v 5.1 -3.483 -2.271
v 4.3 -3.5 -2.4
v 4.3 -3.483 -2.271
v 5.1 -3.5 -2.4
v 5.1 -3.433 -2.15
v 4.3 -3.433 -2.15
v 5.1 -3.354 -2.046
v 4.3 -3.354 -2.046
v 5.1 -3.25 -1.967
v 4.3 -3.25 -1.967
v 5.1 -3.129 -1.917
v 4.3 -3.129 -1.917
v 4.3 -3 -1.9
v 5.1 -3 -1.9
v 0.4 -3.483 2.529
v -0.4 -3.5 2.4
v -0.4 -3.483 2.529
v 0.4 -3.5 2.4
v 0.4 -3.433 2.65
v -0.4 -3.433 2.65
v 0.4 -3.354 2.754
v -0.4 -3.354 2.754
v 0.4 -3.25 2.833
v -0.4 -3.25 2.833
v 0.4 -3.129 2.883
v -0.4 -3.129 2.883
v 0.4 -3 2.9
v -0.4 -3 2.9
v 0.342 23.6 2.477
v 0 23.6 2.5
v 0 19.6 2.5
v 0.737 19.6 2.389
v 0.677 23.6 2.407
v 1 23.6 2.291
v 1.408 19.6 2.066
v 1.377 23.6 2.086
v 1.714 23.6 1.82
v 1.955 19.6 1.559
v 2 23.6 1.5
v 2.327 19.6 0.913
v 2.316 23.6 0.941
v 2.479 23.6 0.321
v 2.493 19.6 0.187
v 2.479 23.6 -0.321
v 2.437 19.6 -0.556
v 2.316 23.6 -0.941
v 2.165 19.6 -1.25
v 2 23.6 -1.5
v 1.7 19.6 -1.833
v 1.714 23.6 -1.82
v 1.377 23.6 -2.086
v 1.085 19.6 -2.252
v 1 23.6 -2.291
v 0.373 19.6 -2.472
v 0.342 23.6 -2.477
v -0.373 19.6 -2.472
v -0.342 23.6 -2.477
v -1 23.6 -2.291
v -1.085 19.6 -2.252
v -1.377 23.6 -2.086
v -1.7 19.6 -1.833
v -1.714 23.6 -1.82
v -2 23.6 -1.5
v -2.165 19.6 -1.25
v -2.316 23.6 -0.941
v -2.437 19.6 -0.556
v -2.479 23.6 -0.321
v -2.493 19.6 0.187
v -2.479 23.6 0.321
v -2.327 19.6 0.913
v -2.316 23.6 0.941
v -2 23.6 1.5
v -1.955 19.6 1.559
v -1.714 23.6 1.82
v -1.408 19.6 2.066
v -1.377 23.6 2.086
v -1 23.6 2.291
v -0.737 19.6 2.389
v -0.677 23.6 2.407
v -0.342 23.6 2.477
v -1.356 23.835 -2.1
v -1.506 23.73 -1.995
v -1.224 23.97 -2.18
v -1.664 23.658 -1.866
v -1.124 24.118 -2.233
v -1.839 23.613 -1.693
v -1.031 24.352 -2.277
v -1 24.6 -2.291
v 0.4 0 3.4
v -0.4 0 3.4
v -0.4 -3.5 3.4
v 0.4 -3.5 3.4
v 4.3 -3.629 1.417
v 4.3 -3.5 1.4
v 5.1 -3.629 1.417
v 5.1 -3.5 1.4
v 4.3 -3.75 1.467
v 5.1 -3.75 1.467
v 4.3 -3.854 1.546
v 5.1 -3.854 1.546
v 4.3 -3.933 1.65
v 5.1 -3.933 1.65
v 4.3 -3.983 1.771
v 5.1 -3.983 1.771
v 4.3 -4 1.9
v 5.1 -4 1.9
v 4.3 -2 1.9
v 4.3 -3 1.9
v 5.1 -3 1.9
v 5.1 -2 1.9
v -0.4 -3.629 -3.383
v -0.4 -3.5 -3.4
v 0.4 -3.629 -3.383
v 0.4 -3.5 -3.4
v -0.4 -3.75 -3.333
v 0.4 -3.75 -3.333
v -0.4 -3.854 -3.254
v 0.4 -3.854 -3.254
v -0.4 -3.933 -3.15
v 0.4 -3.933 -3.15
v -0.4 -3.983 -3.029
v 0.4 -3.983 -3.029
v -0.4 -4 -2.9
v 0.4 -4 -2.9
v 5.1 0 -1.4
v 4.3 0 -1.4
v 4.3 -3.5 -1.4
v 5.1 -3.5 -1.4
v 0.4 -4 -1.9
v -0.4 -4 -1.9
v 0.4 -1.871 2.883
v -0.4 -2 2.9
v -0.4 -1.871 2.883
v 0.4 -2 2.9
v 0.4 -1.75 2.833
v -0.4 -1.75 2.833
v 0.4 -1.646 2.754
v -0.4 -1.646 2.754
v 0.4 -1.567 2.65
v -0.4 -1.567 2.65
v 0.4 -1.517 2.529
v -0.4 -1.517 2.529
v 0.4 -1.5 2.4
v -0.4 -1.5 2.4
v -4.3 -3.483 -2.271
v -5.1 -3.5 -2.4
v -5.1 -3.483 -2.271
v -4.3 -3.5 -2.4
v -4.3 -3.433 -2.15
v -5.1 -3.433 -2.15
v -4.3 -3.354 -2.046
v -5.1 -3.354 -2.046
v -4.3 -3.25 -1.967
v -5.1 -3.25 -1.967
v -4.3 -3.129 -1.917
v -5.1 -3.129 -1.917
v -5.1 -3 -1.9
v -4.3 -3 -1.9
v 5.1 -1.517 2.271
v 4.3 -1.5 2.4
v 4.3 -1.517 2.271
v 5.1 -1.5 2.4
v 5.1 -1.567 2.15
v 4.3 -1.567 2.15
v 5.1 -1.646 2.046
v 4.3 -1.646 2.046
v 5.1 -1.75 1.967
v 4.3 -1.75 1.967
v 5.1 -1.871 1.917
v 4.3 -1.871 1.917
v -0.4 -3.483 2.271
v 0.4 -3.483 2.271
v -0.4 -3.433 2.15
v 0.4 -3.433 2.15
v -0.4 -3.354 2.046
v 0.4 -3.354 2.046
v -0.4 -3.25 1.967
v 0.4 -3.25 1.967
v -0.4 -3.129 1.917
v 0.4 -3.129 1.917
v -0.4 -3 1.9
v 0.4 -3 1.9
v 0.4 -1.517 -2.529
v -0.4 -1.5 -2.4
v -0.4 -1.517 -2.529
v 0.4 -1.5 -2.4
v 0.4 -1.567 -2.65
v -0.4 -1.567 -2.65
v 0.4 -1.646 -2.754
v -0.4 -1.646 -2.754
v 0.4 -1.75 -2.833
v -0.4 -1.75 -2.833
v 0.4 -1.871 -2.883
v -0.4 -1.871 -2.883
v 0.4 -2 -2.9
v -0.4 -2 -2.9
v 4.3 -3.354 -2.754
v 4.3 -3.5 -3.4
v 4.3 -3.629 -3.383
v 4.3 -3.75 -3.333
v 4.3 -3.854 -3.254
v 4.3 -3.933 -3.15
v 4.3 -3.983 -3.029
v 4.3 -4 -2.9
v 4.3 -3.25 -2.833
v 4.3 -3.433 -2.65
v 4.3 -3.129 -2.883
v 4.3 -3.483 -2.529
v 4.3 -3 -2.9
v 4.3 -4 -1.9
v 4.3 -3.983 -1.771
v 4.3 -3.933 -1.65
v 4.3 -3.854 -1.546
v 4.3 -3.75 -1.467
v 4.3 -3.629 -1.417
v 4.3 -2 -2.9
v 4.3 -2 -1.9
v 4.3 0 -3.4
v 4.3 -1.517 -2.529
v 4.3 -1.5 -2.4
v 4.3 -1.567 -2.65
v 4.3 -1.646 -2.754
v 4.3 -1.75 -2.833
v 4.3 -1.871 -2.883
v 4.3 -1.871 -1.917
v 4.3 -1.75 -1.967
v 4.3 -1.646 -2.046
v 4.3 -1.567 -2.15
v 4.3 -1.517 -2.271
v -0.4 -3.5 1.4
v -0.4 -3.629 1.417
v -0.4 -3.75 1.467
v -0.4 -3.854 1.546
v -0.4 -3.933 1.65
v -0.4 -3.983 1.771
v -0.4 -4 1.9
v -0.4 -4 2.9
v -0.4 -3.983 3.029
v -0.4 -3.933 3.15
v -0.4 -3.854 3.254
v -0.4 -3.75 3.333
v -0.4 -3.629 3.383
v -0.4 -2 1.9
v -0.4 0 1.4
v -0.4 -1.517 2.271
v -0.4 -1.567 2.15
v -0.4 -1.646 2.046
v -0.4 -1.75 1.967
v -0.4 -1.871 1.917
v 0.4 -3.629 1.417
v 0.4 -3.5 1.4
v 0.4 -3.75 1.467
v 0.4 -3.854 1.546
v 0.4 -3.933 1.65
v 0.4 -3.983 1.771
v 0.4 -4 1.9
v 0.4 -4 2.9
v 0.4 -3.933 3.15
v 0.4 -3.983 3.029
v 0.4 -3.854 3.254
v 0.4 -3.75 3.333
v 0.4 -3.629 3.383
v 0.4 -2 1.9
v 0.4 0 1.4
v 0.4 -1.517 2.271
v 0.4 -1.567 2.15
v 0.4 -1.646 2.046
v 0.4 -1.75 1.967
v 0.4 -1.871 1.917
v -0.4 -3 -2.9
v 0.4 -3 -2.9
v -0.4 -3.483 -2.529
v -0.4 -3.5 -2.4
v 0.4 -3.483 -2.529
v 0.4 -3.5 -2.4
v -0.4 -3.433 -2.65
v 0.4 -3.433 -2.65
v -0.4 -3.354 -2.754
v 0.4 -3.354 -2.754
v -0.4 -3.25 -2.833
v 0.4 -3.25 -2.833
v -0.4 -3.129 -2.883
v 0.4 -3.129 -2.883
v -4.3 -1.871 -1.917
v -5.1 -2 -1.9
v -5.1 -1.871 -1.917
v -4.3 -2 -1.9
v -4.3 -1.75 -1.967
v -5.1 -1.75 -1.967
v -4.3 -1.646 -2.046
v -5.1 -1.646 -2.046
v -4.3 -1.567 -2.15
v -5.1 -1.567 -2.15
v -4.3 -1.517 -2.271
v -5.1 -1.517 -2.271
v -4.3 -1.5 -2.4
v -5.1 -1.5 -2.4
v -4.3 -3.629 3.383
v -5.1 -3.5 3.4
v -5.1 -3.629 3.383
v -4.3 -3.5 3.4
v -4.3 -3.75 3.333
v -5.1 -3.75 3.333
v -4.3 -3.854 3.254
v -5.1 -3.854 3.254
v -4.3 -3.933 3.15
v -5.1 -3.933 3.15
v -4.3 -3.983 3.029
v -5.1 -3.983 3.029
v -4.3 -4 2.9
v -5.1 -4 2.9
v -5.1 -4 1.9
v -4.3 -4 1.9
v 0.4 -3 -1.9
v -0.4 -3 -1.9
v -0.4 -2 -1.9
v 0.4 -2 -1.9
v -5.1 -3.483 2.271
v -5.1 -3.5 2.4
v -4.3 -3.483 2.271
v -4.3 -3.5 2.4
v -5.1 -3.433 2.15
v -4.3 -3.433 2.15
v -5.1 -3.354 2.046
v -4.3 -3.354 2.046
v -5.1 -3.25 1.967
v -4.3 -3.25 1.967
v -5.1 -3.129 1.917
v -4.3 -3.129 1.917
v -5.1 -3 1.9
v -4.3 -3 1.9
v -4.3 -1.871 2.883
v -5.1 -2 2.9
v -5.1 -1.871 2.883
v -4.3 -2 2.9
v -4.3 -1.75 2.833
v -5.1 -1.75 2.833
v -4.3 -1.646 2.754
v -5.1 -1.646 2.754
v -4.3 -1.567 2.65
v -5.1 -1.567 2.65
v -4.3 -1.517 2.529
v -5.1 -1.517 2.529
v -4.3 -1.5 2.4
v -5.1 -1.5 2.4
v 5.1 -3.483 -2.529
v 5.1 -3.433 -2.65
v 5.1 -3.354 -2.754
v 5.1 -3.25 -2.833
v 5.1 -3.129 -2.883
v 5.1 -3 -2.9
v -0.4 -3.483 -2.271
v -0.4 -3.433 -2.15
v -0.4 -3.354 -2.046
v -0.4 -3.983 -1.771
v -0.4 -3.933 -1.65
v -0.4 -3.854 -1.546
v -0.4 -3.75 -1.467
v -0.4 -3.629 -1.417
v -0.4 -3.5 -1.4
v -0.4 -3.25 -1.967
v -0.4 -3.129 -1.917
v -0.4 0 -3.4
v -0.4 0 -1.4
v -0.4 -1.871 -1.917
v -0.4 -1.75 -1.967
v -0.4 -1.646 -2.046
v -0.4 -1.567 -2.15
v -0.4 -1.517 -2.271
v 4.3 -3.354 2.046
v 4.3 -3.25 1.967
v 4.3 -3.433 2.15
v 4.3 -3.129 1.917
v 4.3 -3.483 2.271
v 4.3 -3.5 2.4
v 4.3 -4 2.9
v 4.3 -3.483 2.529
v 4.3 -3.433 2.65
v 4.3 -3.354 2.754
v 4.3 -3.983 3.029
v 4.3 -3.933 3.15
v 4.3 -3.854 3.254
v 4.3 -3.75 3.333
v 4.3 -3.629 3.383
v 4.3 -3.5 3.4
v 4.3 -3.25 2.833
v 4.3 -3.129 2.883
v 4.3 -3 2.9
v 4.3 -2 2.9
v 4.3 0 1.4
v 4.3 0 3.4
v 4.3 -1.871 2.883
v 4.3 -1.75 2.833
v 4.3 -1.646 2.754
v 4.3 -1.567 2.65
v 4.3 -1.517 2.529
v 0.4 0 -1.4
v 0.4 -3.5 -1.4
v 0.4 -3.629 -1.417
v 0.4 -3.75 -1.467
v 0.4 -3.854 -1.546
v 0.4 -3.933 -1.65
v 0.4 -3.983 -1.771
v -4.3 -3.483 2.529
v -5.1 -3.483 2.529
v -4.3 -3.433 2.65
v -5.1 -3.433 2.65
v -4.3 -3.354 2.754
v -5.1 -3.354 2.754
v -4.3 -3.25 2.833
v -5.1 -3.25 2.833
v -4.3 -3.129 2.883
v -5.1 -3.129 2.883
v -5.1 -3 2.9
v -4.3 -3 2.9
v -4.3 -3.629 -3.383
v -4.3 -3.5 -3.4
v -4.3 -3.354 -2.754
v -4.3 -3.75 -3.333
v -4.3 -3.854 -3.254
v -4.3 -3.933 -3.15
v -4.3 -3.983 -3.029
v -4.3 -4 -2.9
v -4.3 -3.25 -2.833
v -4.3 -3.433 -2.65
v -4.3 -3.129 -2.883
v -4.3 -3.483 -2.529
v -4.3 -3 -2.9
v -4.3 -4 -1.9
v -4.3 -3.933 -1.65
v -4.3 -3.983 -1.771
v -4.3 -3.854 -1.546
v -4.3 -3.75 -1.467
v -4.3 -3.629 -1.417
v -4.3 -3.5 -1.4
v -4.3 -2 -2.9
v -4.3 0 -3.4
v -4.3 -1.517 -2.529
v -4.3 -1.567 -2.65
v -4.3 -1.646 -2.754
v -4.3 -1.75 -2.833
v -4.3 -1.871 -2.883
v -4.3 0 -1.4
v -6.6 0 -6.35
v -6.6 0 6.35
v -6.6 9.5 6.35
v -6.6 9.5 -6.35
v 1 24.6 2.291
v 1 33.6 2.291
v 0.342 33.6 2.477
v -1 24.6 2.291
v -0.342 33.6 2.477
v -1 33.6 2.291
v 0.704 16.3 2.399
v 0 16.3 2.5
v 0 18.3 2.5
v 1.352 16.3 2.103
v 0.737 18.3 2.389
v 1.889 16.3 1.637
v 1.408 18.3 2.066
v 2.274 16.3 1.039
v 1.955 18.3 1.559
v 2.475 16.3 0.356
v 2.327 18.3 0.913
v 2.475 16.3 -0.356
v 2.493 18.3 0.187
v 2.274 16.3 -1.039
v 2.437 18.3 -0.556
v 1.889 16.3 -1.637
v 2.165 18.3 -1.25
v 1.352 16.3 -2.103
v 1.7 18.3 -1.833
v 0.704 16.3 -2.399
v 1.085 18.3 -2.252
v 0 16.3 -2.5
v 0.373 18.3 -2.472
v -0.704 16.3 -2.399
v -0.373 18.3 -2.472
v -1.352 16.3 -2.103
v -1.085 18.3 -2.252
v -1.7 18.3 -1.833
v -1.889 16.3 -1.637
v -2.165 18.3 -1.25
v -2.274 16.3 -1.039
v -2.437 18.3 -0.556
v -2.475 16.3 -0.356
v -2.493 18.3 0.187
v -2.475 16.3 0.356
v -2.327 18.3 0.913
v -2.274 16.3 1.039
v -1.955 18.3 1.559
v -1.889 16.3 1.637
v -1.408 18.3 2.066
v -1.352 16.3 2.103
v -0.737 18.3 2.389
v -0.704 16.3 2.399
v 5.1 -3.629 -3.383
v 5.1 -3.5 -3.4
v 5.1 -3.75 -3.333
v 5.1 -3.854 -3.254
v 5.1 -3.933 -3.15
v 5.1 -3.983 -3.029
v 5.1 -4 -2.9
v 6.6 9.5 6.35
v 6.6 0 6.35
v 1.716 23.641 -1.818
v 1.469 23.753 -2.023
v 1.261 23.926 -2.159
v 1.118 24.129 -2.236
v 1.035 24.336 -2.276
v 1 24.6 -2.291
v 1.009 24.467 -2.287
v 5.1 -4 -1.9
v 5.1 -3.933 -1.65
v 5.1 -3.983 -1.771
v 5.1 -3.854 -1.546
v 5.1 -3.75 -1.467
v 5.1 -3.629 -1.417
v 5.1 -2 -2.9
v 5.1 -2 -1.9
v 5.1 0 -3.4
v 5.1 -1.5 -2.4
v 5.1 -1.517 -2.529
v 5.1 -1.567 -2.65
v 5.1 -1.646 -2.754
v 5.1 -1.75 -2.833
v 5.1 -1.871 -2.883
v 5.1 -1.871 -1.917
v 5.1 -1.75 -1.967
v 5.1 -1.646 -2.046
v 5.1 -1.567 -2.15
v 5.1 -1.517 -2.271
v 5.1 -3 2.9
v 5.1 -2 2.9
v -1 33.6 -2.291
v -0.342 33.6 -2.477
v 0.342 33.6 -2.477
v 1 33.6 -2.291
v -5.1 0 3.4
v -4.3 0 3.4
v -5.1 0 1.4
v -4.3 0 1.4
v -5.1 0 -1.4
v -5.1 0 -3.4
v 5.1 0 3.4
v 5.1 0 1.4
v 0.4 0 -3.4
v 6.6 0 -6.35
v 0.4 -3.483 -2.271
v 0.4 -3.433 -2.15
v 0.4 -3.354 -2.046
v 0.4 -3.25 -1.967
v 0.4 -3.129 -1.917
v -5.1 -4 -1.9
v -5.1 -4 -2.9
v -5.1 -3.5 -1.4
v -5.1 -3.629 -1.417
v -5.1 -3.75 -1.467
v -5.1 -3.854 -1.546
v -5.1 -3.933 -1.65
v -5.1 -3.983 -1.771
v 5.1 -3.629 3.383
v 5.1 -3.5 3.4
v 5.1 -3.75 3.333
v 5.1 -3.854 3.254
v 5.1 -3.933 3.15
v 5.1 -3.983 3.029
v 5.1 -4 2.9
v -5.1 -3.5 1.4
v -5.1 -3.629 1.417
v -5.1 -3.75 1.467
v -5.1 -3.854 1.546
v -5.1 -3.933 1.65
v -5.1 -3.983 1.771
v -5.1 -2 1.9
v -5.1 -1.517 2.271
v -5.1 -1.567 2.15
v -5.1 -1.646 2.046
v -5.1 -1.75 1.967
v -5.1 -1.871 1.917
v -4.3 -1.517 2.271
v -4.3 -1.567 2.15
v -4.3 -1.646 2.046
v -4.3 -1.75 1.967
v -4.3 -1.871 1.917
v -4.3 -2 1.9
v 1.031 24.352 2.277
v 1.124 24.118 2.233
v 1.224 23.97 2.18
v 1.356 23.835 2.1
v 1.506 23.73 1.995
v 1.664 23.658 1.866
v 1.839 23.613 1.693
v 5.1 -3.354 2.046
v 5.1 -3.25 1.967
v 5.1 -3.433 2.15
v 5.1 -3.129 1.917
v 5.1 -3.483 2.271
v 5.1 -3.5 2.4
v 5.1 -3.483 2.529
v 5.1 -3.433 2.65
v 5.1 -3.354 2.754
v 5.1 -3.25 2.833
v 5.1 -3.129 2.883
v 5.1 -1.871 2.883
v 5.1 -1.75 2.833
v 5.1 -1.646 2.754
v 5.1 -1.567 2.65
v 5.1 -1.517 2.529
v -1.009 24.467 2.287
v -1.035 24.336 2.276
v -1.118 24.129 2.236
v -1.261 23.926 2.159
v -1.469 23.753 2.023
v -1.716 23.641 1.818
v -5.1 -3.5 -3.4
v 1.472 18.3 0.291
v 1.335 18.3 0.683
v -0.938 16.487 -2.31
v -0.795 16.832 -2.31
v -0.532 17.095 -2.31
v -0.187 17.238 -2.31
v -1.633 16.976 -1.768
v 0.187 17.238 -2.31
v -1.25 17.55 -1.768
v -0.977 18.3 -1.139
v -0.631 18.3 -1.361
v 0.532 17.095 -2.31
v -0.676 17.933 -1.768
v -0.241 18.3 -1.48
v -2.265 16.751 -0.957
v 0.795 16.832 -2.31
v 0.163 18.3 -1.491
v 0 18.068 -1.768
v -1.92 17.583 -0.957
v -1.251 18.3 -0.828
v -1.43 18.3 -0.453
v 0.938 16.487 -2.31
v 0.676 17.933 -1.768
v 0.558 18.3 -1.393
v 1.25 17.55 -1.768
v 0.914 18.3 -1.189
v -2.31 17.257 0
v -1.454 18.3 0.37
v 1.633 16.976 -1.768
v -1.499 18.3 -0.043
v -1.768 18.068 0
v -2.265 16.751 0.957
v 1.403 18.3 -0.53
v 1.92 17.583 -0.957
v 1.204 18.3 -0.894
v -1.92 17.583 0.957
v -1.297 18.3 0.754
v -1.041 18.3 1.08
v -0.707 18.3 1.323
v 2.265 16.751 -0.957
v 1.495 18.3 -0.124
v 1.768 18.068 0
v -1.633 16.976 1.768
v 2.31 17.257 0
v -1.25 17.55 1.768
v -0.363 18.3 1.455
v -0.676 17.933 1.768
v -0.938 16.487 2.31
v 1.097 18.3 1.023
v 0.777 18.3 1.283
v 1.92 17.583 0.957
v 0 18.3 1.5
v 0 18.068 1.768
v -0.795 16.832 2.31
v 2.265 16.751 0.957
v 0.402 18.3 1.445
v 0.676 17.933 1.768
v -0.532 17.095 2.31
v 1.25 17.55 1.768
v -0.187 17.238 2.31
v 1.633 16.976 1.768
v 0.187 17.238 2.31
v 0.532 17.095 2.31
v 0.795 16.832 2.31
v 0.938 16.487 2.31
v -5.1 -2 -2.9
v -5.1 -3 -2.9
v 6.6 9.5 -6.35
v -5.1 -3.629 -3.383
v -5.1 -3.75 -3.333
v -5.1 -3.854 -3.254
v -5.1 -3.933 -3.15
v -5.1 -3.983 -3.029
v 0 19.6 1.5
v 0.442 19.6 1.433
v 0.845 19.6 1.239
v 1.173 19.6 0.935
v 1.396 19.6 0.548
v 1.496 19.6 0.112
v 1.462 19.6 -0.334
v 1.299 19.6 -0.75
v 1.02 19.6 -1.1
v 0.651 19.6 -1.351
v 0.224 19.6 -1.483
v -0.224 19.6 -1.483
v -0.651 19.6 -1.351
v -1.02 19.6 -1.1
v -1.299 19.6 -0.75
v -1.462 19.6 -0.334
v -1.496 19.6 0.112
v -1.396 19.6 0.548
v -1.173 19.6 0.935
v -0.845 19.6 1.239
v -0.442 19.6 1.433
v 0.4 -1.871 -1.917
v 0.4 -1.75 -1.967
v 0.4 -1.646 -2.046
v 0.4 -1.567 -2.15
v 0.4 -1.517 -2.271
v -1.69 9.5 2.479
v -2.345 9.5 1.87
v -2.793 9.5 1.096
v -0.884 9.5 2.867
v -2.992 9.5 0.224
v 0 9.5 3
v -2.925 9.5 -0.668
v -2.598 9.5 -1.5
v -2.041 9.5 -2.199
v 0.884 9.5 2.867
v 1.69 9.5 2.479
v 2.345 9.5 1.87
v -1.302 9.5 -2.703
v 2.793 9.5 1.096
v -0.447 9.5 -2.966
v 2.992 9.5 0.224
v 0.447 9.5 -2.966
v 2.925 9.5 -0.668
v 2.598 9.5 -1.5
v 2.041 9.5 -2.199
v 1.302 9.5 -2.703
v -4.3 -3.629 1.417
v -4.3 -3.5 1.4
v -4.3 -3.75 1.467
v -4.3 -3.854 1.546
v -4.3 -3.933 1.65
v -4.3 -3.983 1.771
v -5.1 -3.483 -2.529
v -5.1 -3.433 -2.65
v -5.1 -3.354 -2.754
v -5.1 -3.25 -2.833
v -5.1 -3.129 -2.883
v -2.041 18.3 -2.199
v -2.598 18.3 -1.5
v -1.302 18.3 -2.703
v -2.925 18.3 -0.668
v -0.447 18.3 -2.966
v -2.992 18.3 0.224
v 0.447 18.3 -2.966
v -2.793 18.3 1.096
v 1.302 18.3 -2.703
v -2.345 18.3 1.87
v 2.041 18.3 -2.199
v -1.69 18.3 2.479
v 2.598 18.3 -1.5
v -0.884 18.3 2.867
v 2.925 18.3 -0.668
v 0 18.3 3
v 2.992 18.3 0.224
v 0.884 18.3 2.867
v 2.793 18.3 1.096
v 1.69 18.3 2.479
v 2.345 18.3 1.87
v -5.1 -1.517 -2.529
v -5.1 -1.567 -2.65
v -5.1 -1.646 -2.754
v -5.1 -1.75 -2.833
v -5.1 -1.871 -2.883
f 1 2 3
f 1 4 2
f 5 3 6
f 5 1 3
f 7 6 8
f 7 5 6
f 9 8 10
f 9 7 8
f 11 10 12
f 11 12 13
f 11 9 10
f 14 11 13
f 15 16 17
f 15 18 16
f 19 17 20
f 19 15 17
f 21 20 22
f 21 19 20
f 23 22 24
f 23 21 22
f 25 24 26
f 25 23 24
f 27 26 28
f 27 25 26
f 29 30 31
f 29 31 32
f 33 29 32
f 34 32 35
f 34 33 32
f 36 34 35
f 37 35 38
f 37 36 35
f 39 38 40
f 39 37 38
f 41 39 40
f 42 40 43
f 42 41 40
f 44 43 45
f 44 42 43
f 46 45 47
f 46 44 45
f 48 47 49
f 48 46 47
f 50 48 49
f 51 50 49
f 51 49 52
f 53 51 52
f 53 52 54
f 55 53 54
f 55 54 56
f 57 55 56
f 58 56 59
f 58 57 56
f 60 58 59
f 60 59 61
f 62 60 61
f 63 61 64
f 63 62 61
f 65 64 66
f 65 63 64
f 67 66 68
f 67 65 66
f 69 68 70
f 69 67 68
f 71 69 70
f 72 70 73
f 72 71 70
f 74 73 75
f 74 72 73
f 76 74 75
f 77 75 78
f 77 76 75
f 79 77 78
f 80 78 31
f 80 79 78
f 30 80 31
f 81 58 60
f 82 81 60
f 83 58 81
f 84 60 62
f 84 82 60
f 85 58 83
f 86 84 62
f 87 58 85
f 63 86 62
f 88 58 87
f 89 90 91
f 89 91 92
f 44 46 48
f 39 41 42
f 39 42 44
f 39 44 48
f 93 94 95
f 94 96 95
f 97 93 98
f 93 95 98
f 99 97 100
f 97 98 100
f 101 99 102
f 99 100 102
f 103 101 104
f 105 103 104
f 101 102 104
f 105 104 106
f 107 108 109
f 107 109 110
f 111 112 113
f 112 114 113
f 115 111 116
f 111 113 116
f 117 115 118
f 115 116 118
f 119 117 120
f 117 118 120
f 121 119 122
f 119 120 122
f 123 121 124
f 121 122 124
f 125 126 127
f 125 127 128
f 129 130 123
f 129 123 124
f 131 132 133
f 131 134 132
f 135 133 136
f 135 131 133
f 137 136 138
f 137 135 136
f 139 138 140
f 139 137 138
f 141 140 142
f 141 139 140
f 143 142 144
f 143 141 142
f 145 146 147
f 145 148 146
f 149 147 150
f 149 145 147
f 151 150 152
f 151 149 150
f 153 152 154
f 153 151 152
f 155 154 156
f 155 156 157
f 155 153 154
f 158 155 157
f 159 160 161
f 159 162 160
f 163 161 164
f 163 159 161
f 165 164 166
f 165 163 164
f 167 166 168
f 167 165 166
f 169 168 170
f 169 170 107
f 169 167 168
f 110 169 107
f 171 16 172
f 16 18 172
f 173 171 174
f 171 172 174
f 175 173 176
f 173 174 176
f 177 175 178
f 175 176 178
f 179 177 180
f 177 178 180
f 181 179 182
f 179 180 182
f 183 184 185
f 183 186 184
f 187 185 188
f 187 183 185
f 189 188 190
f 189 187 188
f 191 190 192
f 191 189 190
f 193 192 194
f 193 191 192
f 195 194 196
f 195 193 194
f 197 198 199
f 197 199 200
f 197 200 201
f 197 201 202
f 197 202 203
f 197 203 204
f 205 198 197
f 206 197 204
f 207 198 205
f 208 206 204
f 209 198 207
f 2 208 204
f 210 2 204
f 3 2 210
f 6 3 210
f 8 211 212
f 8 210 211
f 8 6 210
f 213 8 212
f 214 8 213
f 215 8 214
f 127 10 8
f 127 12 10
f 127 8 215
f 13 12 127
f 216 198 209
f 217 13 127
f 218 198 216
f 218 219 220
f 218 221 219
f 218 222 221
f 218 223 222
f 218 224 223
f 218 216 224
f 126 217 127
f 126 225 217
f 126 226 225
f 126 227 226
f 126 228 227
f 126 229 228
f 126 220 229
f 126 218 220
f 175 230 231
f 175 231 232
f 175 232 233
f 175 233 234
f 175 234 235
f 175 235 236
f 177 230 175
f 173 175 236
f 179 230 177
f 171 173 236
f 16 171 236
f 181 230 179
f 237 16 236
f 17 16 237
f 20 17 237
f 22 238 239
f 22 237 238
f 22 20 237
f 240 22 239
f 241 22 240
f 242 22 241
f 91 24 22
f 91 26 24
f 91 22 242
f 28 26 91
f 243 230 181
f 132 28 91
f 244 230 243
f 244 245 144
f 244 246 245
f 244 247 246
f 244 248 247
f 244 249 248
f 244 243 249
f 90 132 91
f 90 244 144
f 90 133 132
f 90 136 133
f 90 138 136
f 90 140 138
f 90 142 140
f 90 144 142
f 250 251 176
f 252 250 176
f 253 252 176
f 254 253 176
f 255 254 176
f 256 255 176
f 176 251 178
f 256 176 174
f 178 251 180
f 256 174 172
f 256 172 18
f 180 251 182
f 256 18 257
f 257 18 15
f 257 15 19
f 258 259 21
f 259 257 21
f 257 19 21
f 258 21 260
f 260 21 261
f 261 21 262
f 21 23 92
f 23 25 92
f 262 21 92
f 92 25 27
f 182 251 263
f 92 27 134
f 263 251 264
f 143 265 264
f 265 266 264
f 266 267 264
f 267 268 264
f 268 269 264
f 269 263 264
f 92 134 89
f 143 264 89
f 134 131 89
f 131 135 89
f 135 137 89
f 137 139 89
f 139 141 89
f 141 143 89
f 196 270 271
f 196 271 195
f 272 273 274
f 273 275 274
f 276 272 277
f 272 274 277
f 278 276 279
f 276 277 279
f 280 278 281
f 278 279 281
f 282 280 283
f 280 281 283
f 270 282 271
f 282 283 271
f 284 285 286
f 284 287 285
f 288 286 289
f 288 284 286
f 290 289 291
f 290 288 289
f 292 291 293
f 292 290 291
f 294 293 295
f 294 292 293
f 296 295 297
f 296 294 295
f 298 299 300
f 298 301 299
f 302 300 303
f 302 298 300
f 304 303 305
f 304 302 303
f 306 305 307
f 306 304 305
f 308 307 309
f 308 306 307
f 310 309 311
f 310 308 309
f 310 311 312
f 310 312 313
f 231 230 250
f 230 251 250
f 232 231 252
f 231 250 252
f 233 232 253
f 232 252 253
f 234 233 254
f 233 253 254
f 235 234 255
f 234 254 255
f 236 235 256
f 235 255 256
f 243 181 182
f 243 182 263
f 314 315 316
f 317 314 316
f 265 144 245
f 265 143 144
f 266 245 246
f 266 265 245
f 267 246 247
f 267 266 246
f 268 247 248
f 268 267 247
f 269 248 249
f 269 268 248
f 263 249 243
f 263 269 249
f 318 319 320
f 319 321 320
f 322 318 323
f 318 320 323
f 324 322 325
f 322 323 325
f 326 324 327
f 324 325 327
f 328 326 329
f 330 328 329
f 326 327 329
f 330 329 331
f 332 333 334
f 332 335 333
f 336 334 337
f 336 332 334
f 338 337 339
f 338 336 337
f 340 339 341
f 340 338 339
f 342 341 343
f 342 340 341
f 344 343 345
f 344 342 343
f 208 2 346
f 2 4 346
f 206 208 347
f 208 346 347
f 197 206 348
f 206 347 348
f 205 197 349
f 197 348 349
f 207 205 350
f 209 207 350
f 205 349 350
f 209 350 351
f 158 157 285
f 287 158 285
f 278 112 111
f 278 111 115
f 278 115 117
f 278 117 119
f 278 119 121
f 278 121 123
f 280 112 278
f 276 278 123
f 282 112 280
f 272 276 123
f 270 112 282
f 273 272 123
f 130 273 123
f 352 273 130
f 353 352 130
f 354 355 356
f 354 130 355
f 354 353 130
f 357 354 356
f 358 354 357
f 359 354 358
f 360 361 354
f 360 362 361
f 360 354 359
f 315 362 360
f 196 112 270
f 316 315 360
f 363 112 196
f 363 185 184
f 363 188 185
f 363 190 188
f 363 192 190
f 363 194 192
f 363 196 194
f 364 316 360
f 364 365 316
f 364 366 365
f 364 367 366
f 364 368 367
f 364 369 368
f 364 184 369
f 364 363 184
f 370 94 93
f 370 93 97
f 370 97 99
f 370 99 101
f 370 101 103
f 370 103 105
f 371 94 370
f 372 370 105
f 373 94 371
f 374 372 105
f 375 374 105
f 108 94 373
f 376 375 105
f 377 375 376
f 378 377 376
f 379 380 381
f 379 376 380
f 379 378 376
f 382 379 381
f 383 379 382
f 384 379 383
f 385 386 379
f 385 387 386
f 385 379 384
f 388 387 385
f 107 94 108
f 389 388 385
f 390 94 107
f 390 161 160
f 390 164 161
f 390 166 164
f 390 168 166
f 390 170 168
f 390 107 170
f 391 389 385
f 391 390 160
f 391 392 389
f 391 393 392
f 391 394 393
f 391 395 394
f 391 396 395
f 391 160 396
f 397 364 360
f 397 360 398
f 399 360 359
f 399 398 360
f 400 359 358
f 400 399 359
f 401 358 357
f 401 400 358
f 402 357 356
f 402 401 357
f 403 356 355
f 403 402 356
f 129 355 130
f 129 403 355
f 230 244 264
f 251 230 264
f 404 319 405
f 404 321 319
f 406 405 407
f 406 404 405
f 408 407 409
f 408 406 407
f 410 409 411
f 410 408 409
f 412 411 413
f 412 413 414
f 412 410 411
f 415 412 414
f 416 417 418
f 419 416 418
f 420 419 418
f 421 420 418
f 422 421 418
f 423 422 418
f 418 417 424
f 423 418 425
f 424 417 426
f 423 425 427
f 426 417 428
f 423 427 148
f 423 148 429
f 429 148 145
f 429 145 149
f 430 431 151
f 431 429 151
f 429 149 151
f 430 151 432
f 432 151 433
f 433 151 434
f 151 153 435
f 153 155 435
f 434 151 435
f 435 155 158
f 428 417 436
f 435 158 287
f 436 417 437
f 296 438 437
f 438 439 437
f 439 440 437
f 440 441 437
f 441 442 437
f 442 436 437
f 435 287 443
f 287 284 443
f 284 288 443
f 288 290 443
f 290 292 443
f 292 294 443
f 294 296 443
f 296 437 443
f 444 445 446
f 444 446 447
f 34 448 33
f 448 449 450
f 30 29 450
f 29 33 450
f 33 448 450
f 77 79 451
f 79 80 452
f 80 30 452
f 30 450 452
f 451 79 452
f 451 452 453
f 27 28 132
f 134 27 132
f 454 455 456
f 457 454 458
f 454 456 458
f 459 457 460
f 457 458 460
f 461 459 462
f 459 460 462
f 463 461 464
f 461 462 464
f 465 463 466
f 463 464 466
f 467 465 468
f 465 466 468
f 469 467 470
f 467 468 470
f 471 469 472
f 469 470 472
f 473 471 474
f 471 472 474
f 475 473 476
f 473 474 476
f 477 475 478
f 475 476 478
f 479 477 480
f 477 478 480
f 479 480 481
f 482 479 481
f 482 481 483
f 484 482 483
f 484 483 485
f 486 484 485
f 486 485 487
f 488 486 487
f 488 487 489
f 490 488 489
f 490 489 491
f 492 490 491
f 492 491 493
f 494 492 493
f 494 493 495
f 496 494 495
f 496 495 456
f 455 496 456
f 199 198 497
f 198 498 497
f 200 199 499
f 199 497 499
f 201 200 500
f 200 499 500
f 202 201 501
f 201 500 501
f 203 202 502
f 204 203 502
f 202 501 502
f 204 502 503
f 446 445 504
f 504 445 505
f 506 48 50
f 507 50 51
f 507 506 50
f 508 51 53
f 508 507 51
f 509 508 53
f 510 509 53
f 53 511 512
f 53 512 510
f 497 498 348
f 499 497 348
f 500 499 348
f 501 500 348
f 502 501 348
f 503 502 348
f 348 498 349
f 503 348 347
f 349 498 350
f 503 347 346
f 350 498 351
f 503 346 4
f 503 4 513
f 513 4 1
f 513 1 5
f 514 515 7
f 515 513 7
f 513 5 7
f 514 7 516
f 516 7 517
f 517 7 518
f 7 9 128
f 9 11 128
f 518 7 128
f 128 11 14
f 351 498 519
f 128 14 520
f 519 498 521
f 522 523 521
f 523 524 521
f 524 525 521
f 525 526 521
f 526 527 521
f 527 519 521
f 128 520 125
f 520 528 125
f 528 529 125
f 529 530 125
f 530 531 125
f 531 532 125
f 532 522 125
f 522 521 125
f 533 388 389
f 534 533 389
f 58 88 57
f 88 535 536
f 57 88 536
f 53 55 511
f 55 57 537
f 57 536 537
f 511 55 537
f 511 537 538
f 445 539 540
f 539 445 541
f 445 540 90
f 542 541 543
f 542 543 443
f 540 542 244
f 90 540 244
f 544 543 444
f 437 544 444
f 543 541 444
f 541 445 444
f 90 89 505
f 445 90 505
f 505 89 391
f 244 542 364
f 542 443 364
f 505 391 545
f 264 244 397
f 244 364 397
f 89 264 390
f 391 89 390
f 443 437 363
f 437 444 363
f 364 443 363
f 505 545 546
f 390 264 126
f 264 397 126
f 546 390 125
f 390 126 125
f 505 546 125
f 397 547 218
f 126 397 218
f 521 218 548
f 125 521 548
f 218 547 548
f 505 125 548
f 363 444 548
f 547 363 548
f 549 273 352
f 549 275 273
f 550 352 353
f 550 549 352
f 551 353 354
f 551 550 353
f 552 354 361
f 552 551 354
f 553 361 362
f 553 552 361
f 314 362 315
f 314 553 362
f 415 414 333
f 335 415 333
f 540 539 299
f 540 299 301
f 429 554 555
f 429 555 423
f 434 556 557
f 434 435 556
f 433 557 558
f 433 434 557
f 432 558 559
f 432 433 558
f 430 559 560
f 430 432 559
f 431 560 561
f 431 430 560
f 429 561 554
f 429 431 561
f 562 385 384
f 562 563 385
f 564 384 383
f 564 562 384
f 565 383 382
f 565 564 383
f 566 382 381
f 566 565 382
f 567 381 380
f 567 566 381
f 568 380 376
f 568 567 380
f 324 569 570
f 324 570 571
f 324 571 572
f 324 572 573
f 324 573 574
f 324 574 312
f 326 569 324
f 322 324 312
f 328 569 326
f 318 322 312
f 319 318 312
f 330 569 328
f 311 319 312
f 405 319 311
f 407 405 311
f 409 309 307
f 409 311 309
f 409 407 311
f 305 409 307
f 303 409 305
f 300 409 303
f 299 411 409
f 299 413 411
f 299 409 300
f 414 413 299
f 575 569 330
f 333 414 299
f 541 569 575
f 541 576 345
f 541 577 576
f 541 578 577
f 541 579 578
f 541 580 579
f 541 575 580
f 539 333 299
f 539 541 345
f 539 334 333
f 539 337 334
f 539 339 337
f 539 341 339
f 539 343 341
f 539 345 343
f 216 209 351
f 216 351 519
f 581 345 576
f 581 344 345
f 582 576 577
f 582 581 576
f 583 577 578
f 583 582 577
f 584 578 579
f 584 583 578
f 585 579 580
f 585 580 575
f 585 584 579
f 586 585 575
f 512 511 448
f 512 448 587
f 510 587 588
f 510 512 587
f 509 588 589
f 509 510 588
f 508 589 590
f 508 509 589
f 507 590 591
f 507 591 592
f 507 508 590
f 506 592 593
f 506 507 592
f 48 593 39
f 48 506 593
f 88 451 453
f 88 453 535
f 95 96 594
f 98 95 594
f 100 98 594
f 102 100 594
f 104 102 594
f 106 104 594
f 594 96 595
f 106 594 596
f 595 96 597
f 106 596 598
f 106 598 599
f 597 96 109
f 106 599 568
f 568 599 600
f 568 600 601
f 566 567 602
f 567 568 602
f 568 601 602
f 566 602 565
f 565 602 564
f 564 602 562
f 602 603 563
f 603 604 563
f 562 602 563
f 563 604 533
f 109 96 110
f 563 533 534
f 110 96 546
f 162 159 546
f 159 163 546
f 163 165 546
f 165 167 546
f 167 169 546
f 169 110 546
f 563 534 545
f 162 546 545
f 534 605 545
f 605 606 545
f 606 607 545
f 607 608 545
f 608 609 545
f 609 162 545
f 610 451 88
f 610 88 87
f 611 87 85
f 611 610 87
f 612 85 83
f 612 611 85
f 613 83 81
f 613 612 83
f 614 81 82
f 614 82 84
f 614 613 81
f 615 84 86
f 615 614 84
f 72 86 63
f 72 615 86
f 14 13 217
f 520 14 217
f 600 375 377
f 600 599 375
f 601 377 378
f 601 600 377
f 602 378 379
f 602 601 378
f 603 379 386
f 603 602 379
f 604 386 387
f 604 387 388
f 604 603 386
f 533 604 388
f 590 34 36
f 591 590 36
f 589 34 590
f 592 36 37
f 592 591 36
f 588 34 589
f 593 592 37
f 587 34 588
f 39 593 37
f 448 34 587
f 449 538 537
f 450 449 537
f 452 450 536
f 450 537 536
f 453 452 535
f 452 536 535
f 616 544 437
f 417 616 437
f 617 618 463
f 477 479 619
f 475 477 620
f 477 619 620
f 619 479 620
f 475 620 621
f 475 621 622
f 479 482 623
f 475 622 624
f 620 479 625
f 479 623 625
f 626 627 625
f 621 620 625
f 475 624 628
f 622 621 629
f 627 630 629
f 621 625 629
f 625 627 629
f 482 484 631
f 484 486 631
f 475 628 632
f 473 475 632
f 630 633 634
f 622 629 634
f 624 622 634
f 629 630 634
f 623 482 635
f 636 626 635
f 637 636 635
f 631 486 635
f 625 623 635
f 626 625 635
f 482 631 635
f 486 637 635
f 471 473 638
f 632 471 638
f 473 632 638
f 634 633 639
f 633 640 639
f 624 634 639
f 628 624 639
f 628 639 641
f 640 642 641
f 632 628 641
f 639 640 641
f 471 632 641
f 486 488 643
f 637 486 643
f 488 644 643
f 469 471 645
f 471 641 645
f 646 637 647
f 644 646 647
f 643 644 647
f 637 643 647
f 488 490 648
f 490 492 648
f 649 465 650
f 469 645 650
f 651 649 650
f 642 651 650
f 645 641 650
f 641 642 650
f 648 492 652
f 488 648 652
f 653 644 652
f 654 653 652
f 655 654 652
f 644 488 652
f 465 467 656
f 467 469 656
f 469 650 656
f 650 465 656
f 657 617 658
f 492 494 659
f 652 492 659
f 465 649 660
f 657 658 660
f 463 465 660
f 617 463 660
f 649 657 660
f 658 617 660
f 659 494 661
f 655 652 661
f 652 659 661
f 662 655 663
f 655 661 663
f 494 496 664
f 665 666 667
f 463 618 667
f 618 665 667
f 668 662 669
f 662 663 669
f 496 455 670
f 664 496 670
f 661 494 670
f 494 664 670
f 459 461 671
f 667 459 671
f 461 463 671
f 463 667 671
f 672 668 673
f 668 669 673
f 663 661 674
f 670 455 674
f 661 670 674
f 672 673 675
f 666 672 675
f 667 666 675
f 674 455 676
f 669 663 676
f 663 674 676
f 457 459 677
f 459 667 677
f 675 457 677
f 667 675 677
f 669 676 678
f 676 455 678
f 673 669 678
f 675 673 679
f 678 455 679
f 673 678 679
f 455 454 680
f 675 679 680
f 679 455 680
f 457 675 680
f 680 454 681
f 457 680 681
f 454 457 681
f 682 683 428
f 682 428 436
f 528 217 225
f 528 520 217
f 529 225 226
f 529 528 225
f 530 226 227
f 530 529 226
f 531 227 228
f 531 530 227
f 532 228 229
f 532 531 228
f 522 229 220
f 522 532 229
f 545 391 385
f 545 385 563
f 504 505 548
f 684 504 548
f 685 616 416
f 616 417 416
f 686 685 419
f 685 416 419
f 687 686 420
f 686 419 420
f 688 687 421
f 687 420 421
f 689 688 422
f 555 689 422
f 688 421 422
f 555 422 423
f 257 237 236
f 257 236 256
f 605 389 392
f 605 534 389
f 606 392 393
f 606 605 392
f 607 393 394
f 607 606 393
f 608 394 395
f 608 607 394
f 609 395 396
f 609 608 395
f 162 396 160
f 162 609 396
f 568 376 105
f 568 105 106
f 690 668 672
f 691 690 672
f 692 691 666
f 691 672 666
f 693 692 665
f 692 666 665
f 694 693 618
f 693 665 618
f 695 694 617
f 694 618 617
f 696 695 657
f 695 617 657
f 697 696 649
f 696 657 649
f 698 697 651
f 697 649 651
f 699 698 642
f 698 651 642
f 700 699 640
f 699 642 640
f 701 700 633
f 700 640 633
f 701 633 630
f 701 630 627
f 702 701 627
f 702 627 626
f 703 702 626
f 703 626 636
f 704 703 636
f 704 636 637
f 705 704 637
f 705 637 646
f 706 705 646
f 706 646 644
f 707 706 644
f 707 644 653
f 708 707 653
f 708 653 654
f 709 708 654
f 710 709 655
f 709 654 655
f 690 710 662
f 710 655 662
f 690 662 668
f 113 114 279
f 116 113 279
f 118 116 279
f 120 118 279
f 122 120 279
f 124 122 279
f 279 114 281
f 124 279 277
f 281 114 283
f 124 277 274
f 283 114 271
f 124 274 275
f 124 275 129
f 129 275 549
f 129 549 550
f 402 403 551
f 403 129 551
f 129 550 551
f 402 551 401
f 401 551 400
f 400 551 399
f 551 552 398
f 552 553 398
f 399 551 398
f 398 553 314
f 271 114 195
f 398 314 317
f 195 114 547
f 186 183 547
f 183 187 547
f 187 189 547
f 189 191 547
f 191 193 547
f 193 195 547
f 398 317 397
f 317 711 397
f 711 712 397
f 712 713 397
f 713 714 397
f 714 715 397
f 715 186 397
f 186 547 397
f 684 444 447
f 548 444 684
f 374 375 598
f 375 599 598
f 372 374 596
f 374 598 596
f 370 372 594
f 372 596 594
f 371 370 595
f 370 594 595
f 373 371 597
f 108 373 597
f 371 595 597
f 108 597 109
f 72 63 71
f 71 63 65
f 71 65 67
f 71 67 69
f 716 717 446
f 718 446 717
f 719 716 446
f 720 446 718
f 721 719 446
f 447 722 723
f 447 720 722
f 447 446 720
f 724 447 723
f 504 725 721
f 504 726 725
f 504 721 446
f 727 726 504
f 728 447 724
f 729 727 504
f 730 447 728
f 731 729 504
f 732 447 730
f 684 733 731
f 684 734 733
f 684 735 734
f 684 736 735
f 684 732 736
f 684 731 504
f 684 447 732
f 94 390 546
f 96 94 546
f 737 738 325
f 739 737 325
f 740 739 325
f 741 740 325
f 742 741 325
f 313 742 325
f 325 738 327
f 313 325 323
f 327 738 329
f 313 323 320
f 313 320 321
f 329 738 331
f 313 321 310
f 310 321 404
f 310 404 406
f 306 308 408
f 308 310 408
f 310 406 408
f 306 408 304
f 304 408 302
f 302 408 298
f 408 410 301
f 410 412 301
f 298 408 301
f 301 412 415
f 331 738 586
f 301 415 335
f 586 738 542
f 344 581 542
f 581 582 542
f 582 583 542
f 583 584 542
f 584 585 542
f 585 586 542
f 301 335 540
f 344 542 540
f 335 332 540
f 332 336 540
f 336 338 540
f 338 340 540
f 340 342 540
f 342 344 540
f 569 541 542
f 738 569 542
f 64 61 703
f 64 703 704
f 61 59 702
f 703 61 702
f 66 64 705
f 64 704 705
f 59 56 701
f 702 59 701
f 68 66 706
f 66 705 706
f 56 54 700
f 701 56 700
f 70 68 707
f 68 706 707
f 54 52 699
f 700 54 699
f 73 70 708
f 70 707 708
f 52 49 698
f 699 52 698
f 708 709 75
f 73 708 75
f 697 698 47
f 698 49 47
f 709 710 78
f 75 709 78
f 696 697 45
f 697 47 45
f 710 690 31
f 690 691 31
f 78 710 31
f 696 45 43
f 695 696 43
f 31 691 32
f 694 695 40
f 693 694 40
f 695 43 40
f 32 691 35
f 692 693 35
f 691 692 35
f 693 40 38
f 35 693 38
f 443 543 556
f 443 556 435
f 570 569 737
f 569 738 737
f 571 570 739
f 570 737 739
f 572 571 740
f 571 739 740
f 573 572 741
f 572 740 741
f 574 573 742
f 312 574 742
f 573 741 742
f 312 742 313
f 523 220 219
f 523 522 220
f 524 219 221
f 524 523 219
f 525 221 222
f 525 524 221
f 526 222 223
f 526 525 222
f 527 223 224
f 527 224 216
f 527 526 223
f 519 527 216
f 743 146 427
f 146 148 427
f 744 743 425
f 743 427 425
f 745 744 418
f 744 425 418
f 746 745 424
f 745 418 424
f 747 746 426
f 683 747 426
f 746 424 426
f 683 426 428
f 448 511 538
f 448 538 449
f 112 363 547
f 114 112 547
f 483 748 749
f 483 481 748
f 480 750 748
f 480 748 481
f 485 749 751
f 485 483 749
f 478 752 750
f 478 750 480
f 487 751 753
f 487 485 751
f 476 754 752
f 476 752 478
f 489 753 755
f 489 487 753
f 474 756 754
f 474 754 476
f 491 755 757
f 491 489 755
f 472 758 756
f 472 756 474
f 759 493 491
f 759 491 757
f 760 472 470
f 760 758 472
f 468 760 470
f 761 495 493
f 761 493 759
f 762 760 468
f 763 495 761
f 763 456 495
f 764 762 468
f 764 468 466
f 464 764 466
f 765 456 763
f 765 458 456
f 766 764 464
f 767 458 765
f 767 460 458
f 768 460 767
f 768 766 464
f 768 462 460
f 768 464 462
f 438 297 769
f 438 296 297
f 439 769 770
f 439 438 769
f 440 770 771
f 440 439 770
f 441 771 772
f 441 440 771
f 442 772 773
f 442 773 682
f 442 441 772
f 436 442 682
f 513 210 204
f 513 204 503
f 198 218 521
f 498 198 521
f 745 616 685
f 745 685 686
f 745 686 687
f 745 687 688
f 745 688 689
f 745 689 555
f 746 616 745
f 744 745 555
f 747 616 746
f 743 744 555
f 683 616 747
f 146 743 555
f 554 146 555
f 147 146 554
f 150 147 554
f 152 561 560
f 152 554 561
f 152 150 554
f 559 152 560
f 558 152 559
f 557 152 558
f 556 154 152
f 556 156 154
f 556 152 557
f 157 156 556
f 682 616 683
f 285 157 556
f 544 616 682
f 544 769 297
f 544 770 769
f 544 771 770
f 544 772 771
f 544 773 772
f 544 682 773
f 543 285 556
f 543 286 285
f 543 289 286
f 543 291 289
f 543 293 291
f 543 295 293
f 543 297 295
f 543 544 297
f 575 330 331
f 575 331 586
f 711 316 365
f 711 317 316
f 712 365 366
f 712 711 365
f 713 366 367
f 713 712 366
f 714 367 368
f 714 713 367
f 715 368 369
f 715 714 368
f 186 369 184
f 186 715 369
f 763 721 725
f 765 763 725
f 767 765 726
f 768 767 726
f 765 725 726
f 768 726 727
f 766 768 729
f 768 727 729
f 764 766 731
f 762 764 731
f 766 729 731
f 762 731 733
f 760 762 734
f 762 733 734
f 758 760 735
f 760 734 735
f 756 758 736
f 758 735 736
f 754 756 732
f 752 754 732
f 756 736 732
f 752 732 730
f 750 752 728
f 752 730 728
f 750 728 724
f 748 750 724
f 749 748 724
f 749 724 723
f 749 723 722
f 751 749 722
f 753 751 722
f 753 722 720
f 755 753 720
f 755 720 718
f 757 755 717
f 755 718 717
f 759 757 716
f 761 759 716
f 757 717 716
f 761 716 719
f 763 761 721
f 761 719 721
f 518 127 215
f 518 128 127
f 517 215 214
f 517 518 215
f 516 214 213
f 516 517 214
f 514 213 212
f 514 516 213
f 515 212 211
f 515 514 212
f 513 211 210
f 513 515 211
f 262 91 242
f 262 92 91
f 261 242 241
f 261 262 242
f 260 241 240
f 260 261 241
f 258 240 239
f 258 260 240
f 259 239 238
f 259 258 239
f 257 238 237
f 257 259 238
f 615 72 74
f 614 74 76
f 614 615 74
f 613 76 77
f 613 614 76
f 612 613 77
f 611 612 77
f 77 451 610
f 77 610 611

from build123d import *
from build123d.topology import SkipClean

# Parameters (mm, degrees)
SKETCH1_W           = 13.2
SKETCH1_H           = 12.7
BOSS_EXTRUDE1_DEPTH = 9.5
SKETCH2_R           = 3
BOSS_EXTRUDE2_DEPTH = 8.8
SKETCH4_R           = 2.5
CUT_EXTRUDE1_DEPTH  = 2
SKETCH5_R           = 1.5
BOSS_EXTRUDE3_DEPTH = 5
REVOLVE2_ANGLE      = 180
FILLET1_R           = 1
SKETCH6_W           = 0.8
SKETCH6_H           = 2
BOSS_EXTRUDE4_DEPTH = 4
SKETCH7_W           = 1
SKETCH7_H           = 2
CUT_EXTRUDE2_DEPTH  = 26.117773
FILLET2_R           = 0.5
BOSS_EXTRUDE5_START = 5.3
SKETCH8_R           = 2.5
BOSS_EXTRUDE5_DEPTH = 4
BOSS_EXTRUDE6_START = 10
BOSS_EXTRUDE6_DEPTH = 10
FILLET3_R           = 1


# Some blends are built 0.0001 mm under size
with BuildPart() as part:
    # Sketch1 → Boss-Extrude1 (new body)
    with BuildSketch(Plane(origin=(0, 0, 0), x_dir=(1, 0, 0), z_dir=(0, 1, 0))):
        Rectangle(SKETCH1_W, SKETCH1_H)
    extrude(amount=BOSS_EXTRUDE1_DEPTH)

    # Sketch2 → Boss-Extrude2 (add)
    with BuildSketch(Plane(origin=(0, 9.5, 0), x_dir=(1, 0, 0), z_dir=(0, 1, 0))):
        with Locations(Location((0, 0, 0), (0, 0, 270))):
            Circle(SKETCH2_R)
    extrude(amount=BOSS_EXTRUDE2_DEPTH)

    # Sketch4 → Cut-Extrude1 (cut)
    with BuildSketch(Plane(origin=(0, 18.3, 0), x_dir=(1, 0, 0), z_dir=(0, 1, 0))):
        with Locations(Location((0, 0, 0), (0, 0, 270))):
            Circle(SKETCH4_R)
    extrude(amount=-CUT_EXTRUDE1_DEPTH, mode=Mode.SUBTRACT)

    # Sketch5 → Boss-Extrude3 (add)
    with BuildSketch(Plane(origin=(0, 16.3, 0), x_dir=(1, 0, 0), z_dir=(0, 1, 0))):
        with Locations(Location((0, 0, 0), (0, 0, 270))):
            Circle(SKETCH5_R)
    extrude(amount=BOSS_EXTRUDE3_DEPTH)

    # Sketch3 → Revolve2 (revolve)
    with BuildSketch(Plane(origin=(0, 16.3, 0), x_dir=(1, 0, 0), z_dir=(0, 1, 0))):
        with BuildLine():
            Line((0, -2.5), (0, 2.5))
            ThreePointArc((0, 2.5), (-2.5, 0), (0, -2.5))
        make_face()
    revolve(axis=Axis((0, 16.3, 3), (0, 0, -1)), revolution_arc=REVOLVE2_ANGLE)

    # Fillet1
    fillet1_edges = [part.edges().sort_by_distance(p)[0] for p in [
        (0, 21.3, -1.5),
    ]]
    fillet(fillet1_edges, radius=FILLET1_R)

    # Sketch6 → Boss-Extrude4 (add)
    with BuildSketch(Plane.XZ):
        with Locations((-4.7, 2.4)):
            Rectangle(SKETCH6_W, SKETCH6_H)
        with Locations((-4.7, -2.4)):
            Rectangle(SKETCH6_W, SKETCH6_H)
        with Locations((0, -2.4)):
            Rectangle(SKETCH6_W, SKETCH6_H)
        with Locations((0, 2.4)):
            Rectangle(SKETCH6_W, SKETCH6_H)
        with Locations((4.7, 2.4)):
            Rectangle(SKETCH6_W, SKETCH6_H)
        with Locations((4.7, -2.4)):
            Rectangle(SKETCH6_W, SKETCH6_H)
    extrude(amount=BOSS_EXTRUDE4_DEPTH)

    # Sketch7 → Cut-Extrude2 (cut, through all)
    with BuildSketch(Plane.ZY.offset(5.1)):
        with Locations((-2.4, -2.5)):
            Rectangle(SKETCH7_W, SKETCH7_H)
        with Locations((2.4, -2.5)):
            Rectangle(SKETCH7_W, SKETCH7_H)
    extrude(amount=-CUT_EXTRUDE2_DEPTH, mode=Mode.SUBTRACT)

    # Fillet2
    fillet2_edges = [part.edges().sort_by_distance(p)[0] for p in [
        (4.7, -3.5, 2.9),
        (4.7, -3.5, 1.9),
        (4.7, -3.5, -1.9),
        (4.7, -3.5, -2.9),
        (4.7, -1.5, -1.9),
        (4.7, -1.5, 2.9),
        (4.7, -1.5, 1.9),
        (4.7, -1.5, -2.9),
        (0, -1.5, 1.9),
        (0, -1.5, 2.9),
        (0, -3.5, 2.9),
        (0, -3.5, 1.9),
        (0, -3.5, -1.9),
        (0, -3.5, -2.9),
        (0, -1.5, -2.9),
        (0, -1.5, -1.9),
        (-4.7, -3.5, 2.9),
        (-4.7, -1.5, 2.9),
        (-4.7, -3.5, 1.9),
        (-4.7, -1.5, 1.9),
        (-4.7, -1.5, -1.9),
        (-4.7, -1.5, -2.9),
        (-4.7, -3.5, -1.9),
        (-4.7, -3.5, -2.9),
        (0, -4, -1.4),
        (0, -4, -3.4),
        (4.7, -4, -1.4),
        (4.7, -4, -3.4),
        (4.7, -4, 1.4),
        (4.7, -4, 3.4),
        (0, -4, 3.4),
        (0, -4, 1.4),
        (-4.7, -4, 3.4),
        (-4.7, -4, 1.4),
        (-4.7, -4, -1.4),
        (-4.7, -4, -3.4),
    ]]
    fillet(fillet2_edges, radius=FILLET2_R - 0.0001)  # a hair under: the kernel refuses the full size

    # Sketch8 → Boss-Extrude5 (add)
    with BuildSketch(Plane(origin=(0, 18.3, 0), x_dir=(1, 0, 0), z_dir=(0, 1, 0)).offset(BOSS_EXTRUDE5_START)):
        with Locations(Location((0, 0, 0), (0, 0, 270))):
            Circle(SKETCH8_R)
    extrude(amount=-BOSS_EXTRUDE5_DEPTH)

    # Sketch9 → Boss-Extrude6 (add)
    with SkipClean():  # the faces are left unmerged after this step: merging them gives an invalid solid
        with BuildSketch(Plane(origin=(0, 23.6, 0), x_dir=(1, 0, 0), z_dir=(0, 1, 0)).offset(BOSS_EXTRUDE6_START)):
            with BuildLine():
                Line((-1, -2.291288), (-1, 2.291288))
                ThreePointArc((-1, 2.291288), (0, 2.5), (1, 2.291288))
                Line((1, 2.291288), (1, -2.291288))
                ThreePointArc((1, -2.291288), (0, -2.5), (-1, -2.291288))
            make_face()
        extrude(amount=-BOSS_EXTRUDE6_DEPTH)

    # Fillet3
    # the kernel refuses this fillet: 1 mm, written as the material it adds along each edge
    with BuildSketch(Plane(origin=(1, 23.6, -4.791288), x_dir=(1, 0, 0), z_dir=(0, 0, 1))) as fillet3_piece_1_section:
        with BuildLine():
            CenterArc((FILLET3_R, FILLET3_R), FILLET3_R, 180, 90)
            Line((0, FILLET3_R), (0, 0))
            Line((0, 0), (FILLET3_R, 0))
        make_face()
    fillet3_piece_1 = extrude(amount=9.582576, mode=Mode.PRIVATE)
    fillet3_piece_1 = fillet3_piece_1 & Plane(origin=(0, 23.834238, 0), x_dir=(0, 0, 1), z_dir=(0, 1, 0)) * Cylinder(2.5, 24, mode=Mode.PRIVATE)
    add(fillet3_piece_1)
    with BuildSketch(Plane(origin=(-1, 23.6, 4.791288), x_dir=(-1, 0, 0), z_dir=(0, 0, -1))) as fillet3_piece_2_section:
        with BuildLine():
            CenterArc((FILLET3_R, FILLET3_R), FILLET3_R, 180, 90)
            Line((0, FILLET3_R), (0, 0))
            Line((0, 0), (FILLET3_R, 0))
        make_face()
    fillet3_piece_2 = extrude(amount=9.582576, mode=Mode.PRIVATE)
    fillet3_piece_2 = fillet3_piece_2 & Plane(origin=(0, 23.834238, 0), x_dir=(0, 0, 1), z_dir=(0, 1, 0)) * Cylinder(2.5, 24, mode=Mode.PRIVATE)
    add(fillet3_piece_2)


solid = part.part
